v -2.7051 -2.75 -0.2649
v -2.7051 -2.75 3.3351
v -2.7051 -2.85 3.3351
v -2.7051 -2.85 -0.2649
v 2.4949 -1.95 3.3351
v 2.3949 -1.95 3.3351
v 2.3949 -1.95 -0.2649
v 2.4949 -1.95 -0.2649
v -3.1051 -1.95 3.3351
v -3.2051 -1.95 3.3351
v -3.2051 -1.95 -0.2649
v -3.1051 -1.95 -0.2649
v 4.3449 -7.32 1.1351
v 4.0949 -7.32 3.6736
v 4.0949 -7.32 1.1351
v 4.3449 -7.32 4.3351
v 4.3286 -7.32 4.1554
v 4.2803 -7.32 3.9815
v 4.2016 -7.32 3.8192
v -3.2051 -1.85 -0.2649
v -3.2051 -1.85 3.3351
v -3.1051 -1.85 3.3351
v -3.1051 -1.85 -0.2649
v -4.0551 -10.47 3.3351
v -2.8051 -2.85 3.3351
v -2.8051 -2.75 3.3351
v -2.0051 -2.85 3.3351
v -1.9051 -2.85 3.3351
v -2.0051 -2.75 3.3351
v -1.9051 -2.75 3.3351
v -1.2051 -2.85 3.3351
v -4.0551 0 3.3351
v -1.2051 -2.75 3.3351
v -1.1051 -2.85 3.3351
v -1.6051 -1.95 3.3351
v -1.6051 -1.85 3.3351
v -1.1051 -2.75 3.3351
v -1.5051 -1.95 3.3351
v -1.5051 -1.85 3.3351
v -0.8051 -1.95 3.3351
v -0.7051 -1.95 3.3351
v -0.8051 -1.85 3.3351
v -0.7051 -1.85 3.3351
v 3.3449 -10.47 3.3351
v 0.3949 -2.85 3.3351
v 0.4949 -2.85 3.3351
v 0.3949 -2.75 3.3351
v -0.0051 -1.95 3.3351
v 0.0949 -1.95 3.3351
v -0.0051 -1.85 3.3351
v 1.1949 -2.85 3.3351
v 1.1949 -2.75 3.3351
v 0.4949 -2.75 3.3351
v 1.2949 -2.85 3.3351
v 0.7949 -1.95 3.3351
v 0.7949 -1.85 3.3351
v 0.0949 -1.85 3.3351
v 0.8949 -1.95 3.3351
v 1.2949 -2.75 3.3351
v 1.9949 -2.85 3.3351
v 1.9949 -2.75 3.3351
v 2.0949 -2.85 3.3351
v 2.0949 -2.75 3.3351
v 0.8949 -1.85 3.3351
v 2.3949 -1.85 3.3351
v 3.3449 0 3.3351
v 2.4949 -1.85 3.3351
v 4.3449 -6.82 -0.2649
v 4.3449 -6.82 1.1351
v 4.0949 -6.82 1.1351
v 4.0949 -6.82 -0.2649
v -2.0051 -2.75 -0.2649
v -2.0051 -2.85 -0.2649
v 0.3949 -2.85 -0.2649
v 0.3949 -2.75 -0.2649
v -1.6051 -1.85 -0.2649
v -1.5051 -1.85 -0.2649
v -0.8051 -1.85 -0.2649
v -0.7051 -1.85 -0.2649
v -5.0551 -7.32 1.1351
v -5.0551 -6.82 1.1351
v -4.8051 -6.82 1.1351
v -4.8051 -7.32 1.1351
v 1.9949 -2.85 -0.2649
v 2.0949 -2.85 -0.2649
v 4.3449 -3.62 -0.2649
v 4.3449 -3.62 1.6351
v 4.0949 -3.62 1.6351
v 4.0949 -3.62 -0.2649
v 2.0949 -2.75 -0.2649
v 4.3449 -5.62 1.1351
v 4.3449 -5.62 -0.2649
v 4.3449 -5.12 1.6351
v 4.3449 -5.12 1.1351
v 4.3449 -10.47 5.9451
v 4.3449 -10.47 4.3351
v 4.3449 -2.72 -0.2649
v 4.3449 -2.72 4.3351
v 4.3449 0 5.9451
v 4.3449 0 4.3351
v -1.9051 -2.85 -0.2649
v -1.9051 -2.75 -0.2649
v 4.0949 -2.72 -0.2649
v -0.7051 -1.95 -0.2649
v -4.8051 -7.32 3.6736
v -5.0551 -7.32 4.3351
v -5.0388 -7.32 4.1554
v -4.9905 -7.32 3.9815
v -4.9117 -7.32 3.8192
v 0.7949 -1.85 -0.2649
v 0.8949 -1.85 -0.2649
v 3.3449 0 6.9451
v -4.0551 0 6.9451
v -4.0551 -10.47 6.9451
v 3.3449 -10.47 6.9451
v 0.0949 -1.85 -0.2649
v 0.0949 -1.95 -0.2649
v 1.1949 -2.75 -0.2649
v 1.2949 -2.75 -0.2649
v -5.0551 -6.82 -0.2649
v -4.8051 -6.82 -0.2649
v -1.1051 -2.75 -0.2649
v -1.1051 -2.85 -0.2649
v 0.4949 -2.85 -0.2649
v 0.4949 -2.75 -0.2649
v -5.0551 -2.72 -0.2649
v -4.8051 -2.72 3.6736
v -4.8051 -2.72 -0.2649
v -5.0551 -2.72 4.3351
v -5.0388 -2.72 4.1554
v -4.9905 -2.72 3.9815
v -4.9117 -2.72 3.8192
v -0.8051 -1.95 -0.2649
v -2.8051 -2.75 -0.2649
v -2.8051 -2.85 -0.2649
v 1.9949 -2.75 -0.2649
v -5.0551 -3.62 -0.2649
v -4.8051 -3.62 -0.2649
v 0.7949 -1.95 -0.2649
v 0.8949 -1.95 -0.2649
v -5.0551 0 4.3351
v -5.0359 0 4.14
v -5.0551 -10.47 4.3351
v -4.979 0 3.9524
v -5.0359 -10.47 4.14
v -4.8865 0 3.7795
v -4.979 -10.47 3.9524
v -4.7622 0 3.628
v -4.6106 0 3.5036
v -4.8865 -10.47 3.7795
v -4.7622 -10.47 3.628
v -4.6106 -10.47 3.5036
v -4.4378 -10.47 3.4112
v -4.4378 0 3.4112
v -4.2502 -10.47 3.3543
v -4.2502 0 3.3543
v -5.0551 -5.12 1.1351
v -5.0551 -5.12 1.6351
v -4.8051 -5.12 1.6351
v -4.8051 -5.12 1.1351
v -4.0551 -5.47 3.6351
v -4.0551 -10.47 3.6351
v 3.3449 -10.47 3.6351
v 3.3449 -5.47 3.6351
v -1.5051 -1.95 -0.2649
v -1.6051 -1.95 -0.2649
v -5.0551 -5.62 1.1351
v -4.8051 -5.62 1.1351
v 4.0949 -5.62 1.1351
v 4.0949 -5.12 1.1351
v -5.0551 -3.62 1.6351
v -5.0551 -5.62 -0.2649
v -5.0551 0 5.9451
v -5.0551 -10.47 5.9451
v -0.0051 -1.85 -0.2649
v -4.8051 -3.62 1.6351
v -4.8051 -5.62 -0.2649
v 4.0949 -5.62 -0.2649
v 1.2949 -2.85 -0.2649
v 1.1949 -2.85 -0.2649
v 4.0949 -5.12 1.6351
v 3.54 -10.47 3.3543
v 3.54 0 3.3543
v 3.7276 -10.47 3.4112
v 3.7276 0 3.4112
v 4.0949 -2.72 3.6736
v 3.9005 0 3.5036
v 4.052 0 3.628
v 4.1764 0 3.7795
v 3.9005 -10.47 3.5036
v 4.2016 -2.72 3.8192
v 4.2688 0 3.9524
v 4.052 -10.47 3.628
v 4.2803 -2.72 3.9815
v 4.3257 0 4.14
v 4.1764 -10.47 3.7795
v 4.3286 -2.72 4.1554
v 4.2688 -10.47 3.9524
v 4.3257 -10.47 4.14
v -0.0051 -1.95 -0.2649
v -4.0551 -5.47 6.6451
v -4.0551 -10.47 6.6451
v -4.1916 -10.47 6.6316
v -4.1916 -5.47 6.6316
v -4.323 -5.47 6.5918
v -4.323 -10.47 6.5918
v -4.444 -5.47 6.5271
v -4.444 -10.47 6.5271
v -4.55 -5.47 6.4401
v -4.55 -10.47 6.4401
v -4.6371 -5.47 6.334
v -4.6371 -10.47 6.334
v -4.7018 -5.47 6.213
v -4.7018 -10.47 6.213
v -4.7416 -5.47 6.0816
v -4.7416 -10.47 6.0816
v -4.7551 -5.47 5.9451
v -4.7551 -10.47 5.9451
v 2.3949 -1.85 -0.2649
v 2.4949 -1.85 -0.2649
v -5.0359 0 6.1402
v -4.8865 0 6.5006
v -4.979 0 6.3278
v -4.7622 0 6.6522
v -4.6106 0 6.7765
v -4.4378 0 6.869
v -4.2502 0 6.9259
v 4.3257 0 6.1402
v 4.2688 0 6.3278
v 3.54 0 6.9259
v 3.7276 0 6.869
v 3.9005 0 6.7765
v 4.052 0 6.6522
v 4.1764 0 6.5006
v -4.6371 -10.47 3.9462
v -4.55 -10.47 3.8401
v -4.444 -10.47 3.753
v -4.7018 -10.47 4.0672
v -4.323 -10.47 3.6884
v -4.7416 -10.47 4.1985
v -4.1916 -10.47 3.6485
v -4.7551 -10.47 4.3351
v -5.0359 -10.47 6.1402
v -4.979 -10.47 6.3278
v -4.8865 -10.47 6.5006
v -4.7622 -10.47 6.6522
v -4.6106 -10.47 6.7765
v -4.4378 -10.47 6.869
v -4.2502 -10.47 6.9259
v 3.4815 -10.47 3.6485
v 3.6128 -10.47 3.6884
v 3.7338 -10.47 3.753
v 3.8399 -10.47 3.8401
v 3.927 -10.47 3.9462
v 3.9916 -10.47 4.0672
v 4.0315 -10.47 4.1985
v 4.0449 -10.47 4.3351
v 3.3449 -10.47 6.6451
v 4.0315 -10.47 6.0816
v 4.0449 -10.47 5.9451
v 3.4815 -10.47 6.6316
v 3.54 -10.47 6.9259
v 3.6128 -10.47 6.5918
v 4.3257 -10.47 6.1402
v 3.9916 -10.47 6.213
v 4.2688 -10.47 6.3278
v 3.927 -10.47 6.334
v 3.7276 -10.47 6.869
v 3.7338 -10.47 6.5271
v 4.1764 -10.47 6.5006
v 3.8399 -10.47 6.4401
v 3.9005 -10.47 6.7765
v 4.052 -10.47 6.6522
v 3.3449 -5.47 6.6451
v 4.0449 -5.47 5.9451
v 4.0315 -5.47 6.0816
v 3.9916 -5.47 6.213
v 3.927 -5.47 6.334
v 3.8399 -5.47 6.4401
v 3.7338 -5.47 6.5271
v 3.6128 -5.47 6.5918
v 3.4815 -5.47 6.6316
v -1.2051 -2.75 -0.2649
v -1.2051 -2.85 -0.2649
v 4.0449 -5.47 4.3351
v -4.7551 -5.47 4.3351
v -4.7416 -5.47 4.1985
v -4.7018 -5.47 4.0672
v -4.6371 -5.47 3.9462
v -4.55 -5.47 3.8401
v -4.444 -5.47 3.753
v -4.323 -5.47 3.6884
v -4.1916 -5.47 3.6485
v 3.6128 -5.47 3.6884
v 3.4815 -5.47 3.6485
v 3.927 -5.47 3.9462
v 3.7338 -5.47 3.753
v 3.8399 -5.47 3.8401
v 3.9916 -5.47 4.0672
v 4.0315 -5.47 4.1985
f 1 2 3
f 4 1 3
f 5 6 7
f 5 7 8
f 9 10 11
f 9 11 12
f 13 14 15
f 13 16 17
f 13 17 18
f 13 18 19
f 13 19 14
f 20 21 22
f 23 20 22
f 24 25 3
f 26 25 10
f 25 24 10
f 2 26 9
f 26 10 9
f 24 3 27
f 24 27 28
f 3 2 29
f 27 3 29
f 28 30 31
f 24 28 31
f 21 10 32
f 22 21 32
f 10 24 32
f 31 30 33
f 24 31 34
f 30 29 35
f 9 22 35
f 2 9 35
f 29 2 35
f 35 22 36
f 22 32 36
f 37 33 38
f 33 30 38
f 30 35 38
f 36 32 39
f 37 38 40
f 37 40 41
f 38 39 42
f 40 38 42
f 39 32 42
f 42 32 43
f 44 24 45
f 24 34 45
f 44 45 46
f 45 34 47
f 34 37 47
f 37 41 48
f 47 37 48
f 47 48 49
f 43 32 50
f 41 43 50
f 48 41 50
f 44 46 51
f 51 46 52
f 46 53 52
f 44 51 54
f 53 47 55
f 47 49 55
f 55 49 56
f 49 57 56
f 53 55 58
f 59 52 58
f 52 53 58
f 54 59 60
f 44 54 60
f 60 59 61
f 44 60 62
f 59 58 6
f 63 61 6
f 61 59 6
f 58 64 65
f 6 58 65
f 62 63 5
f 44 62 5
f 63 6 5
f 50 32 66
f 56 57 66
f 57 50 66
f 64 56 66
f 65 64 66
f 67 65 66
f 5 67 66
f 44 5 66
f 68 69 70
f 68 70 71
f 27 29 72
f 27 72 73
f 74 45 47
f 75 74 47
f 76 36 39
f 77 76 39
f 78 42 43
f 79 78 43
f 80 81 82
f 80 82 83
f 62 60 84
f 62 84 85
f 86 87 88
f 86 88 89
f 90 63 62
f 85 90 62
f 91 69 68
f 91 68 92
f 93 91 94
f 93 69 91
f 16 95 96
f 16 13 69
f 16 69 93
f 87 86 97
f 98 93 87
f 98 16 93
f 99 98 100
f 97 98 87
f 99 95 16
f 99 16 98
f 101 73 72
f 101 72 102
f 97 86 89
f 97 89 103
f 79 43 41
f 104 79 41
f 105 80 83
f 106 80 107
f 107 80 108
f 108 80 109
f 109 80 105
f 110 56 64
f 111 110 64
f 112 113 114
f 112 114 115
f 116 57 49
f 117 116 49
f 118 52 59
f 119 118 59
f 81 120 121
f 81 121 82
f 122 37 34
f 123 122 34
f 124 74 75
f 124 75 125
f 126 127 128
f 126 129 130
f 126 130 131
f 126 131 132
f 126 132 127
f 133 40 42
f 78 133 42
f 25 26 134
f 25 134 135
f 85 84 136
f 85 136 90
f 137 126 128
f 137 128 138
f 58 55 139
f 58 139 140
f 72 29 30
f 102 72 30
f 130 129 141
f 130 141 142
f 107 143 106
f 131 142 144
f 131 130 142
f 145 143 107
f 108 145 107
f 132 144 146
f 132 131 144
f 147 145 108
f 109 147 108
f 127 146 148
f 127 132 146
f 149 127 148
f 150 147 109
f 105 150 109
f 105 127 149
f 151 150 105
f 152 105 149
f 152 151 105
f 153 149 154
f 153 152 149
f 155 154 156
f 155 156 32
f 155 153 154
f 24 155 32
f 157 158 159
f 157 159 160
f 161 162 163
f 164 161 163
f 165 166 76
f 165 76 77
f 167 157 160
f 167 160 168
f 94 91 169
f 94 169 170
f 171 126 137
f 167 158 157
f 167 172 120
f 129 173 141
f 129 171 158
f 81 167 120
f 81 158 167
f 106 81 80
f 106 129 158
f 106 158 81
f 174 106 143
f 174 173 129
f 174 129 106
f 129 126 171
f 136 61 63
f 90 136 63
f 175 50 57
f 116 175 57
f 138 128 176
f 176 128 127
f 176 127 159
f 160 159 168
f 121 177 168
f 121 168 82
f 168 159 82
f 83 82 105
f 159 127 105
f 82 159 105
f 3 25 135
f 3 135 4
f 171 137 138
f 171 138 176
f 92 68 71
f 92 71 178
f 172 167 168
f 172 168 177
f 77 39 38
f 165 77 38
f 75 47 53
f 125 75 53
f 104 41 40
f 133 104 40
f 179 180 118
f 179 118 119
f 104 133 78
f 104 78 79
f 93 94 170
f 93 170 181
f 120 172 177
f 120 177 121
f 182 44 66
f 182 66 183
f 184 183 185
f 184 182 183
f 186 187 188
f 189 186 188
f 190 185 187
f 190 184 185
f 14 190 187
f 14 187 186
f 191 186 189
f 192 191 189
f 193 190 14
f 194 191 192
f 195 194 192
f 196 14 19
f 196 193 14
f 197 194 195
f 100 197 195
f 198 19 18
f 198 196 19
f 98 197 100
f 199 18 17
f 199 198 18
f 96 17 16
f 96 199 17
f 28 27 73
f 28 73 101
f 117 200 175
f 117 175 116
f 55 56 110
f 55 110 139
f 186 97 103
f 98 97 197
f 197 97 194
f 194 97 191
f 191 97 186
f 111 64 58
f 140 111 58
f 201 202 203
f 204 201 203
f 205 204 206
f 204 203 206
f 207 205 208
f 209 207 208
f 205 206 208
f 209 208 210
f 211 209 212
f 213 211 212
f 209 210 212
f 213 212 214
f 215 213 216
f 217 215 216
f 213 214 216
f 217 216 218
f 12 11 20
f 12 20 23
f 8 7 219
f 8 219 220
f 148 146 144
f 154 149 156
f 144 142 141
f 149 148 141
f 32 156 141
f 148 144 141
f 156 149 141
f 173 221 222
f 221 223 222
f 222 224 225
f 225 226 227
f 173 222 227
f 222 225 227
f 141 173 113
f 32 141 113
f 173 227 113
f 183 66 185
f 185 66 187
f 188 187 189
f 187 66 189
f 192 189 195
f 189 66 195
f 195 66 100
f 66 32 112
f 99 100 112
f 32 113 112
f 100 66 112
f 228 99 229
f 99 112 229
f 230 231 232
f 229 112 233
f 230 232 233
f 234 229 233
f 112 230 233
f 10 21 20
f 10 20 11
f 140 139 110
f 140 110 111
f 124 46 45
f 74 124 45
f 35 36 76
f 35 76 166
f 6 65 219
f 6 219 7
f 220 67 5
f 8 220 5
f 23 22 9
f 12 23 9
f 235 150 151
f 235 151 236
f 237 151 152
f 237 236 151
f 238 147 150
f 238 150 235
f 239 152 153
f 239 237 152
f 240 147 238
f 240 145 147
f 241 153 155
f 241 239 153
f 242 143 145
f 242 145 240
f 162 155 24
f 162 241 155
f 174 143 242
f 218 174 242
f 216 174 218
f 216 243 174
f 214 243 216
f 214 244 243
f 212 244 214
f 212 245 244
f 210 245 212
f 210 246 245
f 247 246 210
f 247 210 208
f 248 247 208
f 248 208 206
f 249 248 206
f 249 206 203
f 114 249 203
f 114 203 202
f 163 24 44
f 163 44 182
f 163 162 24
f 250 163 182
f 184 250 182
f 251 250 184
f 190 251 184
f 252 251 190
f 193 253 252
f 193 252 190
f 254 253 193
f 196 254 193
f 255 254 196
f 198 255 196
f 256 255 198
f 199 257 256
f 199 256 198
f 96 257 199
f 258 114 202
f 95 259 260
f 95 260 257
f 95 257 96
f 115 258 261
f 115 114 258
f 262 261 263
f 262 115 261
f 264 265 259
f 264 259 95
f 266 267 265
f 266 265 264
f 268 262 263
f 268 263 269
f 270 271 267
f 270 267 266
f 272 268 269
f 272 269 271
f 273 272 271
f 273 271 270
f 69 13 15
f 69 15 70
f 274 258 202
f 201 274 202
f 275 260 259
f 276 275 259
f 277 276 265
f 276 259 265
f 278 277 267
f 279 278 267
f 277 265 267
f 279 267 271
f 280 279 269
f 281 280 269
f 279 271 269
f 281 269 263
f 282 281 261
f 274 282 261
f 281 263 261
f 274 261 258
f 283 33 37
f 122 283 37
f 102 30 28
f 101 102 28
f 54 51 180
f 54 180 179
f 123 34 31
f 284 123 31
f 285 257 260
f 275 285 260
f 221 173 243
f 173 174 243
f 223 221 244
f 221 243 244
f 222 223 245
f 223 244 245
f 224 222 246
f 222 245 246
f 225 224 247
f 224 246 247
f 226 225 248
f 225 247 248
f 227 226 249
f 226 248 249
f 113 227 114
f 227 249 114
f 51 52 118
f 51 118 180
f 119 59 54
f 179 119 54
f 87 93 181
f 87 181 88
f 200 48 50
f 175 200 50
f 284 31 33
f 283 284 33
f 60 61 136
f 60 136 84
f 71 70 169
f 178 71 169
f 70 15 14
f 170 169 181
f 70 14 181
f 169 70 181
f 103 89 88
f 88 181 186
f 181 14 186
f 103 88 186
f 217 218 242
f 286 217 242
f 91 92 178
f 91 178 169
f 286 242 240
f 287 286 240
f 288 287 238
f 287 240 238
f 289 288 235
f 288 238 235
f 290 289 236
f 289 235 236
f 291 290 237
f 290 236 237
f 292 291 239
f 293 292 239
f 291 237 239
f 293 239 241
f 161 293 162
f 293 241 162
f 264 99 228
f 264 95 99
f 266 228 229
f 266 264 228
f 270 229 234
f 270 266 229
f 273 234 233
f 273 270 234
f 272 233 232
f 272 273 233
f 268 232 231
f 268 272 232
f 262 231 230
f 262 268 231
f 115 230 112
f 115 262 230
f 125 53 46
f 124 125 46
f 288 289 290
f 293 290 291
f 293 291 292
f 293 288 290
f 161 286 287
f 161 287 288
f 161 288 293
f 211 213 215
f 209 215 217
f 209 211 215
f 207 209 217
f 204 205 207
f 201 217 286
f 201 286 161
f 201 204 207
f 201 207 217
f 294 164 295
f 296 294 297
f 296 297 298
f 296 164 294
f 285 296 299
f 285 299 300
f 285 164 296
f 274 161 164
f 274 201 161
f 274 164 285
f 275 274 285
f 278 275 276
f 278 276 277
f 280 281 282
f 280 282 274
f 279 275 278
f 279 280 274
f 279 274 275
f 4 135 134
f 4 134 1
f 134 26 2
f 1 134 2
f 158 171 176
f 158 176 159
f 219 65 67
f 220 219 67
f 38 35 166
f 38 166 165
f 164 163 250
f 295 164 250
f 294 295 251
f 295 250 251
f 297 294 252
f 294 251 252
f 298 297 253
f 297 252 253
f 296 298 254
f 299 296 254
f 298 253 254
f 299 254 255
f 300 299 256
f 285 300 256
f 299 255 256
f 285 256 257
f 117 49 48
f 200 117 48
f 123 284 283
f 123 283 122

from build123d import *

# Parameters (mm, degrees)
F0_W      = 9.4
F0_H      = 3.61
F1_DEPTH  = 10.47
F2_R      = 1
F3_W      = 4.6
F3_H      = 1
F3_H_2    = 0.805
F4_DEPTH  = 0.25
F6_DEPTH  = 0.25
F8_DEPTH  = 5
F9_W      = 0.1
F9_H      = 0.1
F10_DEPTH = 3.6


with BuildPart() as f1:
    # F0 (on Front) → F1 (new body)
    with BuildSketch(Plane.XZ):
        with Locations((-0.355073555, 5.140078254)):
            Rectangle(F0_W, F0_H)
    extrude(amount=F1_DEPTH)

    # F2
    f2_edges = [f1.edges().sort_by_distance(p)[0] for p in [
        (4.344926, -5.235, 6.945078),
        (4.344926, -5.235, 3.335078),
        (-5.055074, -5.235, 6.945078),
        (-5.055074, -5.235, 3.335078),
    ]]
    fillet(f2_edges, radius=F2_R)

    # F3 (on face) → F4 (join)
    with BuildSketch(Plane.YZ.offset(4.344926445)):
        Polygon((-2.72, -0.264921746), (-2.72, 3.335078254), (-7.32, 3.335078254), (-7.32, 1.135078254), (-6.82, 1.135078254), (-6.82, -0.264921746), (-5.62, -0.264921746), (-5.62, 1.135078254), (-5.12, 1.135078254), (-5.12, 1.635078254), (-3.62, 1.635078254), (-3.62, -0.264921746), align=None)
        with Locations((-5.02, 3.835078254)):
            Rectangle(F3_W, F3_H)
        with Locations((-5.02, 4.737578254)):
            Rectangle(F3_W, F3_H_2)
    extrude(amount=-F4_DEPTH)

    # F5 (on face) → F6 (join)
    with BuildSketch(Plane(origin=(-5.055073555, 0, 0), x_dir=(0, -1, 0), z_dir=(-1, 0, 0))):
        Polygon((7.32, 1.135078254), (7.32, 4.335078254), (2.72, 4.335078254), (2.72, -0.264921746), (3.62, -0.264921746), (3.62, 1.635078254), (5.12, 1.635078254), (5.12, 1.135078254), (5.62, 1.135078254), (5.62, -0.264921746), (6.82, -0.264921746), (6.82, 1.135078254), align=None)
    extrude(amount=-F6_DEPTH)

    # F7 (on face) → F8 (cut)
    with BuildSketch(Plane.XZ.offset(10.47)):
        with BuildLine():
            Line((3.344926445, 6.645078254), (-4.055073555, 6.645078254))
            ThreePointArc((-4.055073555, 6.645078254), (-4.5500483018, 6.4400530009), (-4.755073555, 5.945078254))
            Line((-4.755073555, 5.945078254), (-4.755073555, 4.335078254))
            ThreePointArc((-4.755073555, 4.335078254), (-4.5500483018, 3.8401035072), (-4.055073555, 3.635078254))
            Line((-4.055073555, 3.635078254), (3.344926445, 3.635078254))
            ThreePointArc((3.344926445, 3.635078254), (3.8399011918, 3.8401035072), (4.044926445, 4.335078254))
            Line((4.044926445, 4.335078254), (4.044926445, 5.945078254))
            ThreePointArc((4.044926445, 5.945078254), (3.8399011918, 6.4400530009), (3.344926445, 6.645078254))
        make_face()
    extrude(amount=-F8_DEPTH, mode=Mode.SUBTRACT)

    # F9 (on face) → F10 (join, through all)
    with BuildSketch(Plane(origin=(0, 0, 3.335078254), x_dir=(1, 0, 0), z_dir=(0, 0, -1))):
        with Locations((-3.155073555, 1.9)):
            Rectangle(F9_W, F9_H)
        with Locations((-1.555073555, 1.9)):
            Rectangle(F9_W, F9_H)
        Polygon((-0.705073555, 1.95), (-0.805073555, 1.95), (-0.805073555, 1.85), (-0.705073555, 1.85), (-0.705073555, 1.9), align=None)
        Polygon((-0.005073555, 1.95), (-0.005073555, 1.9), (-0.005073555, 1.85), (0.094926445, 1.85), (0.094926445, 1.95), align=None)
        Polygon((-1.105073555, 2.85), (-1.205073555, 2.85), (-1.205073555, 2.75), (-1.105073555, 2.75), (-1.105073555, 2.8), align=None)
        with Locations((-1.955073555, 2.8)):
            Rectangle(F9_W, F9_H)
        with Locations((-2.755073555, 2.8)):
            Rectangle(F9_W, F9_H)
        Polygon((0.394926445, 2.85), (0.394926445, 2.8), (0.394926445, 2.75), (0.494926445, 2.75), (0.494926445, 2.85), align=None)
        with Locations((0.844926445, 1.9)):
            Rectangle(F9_W, F9_H)
        with Locations((1.244926445, 2.8)):
            Rectangle(F9_W, F9_H)
        with Locations((2.044926445, 2.8)):
            Rectangle(F9_W, F9_H)
        with Locations((2.444926445, 1.9)):
            Rectangle(F9_W, F9_H)
    extrude(amount=F10_DEPTH)


solid = f1.part
